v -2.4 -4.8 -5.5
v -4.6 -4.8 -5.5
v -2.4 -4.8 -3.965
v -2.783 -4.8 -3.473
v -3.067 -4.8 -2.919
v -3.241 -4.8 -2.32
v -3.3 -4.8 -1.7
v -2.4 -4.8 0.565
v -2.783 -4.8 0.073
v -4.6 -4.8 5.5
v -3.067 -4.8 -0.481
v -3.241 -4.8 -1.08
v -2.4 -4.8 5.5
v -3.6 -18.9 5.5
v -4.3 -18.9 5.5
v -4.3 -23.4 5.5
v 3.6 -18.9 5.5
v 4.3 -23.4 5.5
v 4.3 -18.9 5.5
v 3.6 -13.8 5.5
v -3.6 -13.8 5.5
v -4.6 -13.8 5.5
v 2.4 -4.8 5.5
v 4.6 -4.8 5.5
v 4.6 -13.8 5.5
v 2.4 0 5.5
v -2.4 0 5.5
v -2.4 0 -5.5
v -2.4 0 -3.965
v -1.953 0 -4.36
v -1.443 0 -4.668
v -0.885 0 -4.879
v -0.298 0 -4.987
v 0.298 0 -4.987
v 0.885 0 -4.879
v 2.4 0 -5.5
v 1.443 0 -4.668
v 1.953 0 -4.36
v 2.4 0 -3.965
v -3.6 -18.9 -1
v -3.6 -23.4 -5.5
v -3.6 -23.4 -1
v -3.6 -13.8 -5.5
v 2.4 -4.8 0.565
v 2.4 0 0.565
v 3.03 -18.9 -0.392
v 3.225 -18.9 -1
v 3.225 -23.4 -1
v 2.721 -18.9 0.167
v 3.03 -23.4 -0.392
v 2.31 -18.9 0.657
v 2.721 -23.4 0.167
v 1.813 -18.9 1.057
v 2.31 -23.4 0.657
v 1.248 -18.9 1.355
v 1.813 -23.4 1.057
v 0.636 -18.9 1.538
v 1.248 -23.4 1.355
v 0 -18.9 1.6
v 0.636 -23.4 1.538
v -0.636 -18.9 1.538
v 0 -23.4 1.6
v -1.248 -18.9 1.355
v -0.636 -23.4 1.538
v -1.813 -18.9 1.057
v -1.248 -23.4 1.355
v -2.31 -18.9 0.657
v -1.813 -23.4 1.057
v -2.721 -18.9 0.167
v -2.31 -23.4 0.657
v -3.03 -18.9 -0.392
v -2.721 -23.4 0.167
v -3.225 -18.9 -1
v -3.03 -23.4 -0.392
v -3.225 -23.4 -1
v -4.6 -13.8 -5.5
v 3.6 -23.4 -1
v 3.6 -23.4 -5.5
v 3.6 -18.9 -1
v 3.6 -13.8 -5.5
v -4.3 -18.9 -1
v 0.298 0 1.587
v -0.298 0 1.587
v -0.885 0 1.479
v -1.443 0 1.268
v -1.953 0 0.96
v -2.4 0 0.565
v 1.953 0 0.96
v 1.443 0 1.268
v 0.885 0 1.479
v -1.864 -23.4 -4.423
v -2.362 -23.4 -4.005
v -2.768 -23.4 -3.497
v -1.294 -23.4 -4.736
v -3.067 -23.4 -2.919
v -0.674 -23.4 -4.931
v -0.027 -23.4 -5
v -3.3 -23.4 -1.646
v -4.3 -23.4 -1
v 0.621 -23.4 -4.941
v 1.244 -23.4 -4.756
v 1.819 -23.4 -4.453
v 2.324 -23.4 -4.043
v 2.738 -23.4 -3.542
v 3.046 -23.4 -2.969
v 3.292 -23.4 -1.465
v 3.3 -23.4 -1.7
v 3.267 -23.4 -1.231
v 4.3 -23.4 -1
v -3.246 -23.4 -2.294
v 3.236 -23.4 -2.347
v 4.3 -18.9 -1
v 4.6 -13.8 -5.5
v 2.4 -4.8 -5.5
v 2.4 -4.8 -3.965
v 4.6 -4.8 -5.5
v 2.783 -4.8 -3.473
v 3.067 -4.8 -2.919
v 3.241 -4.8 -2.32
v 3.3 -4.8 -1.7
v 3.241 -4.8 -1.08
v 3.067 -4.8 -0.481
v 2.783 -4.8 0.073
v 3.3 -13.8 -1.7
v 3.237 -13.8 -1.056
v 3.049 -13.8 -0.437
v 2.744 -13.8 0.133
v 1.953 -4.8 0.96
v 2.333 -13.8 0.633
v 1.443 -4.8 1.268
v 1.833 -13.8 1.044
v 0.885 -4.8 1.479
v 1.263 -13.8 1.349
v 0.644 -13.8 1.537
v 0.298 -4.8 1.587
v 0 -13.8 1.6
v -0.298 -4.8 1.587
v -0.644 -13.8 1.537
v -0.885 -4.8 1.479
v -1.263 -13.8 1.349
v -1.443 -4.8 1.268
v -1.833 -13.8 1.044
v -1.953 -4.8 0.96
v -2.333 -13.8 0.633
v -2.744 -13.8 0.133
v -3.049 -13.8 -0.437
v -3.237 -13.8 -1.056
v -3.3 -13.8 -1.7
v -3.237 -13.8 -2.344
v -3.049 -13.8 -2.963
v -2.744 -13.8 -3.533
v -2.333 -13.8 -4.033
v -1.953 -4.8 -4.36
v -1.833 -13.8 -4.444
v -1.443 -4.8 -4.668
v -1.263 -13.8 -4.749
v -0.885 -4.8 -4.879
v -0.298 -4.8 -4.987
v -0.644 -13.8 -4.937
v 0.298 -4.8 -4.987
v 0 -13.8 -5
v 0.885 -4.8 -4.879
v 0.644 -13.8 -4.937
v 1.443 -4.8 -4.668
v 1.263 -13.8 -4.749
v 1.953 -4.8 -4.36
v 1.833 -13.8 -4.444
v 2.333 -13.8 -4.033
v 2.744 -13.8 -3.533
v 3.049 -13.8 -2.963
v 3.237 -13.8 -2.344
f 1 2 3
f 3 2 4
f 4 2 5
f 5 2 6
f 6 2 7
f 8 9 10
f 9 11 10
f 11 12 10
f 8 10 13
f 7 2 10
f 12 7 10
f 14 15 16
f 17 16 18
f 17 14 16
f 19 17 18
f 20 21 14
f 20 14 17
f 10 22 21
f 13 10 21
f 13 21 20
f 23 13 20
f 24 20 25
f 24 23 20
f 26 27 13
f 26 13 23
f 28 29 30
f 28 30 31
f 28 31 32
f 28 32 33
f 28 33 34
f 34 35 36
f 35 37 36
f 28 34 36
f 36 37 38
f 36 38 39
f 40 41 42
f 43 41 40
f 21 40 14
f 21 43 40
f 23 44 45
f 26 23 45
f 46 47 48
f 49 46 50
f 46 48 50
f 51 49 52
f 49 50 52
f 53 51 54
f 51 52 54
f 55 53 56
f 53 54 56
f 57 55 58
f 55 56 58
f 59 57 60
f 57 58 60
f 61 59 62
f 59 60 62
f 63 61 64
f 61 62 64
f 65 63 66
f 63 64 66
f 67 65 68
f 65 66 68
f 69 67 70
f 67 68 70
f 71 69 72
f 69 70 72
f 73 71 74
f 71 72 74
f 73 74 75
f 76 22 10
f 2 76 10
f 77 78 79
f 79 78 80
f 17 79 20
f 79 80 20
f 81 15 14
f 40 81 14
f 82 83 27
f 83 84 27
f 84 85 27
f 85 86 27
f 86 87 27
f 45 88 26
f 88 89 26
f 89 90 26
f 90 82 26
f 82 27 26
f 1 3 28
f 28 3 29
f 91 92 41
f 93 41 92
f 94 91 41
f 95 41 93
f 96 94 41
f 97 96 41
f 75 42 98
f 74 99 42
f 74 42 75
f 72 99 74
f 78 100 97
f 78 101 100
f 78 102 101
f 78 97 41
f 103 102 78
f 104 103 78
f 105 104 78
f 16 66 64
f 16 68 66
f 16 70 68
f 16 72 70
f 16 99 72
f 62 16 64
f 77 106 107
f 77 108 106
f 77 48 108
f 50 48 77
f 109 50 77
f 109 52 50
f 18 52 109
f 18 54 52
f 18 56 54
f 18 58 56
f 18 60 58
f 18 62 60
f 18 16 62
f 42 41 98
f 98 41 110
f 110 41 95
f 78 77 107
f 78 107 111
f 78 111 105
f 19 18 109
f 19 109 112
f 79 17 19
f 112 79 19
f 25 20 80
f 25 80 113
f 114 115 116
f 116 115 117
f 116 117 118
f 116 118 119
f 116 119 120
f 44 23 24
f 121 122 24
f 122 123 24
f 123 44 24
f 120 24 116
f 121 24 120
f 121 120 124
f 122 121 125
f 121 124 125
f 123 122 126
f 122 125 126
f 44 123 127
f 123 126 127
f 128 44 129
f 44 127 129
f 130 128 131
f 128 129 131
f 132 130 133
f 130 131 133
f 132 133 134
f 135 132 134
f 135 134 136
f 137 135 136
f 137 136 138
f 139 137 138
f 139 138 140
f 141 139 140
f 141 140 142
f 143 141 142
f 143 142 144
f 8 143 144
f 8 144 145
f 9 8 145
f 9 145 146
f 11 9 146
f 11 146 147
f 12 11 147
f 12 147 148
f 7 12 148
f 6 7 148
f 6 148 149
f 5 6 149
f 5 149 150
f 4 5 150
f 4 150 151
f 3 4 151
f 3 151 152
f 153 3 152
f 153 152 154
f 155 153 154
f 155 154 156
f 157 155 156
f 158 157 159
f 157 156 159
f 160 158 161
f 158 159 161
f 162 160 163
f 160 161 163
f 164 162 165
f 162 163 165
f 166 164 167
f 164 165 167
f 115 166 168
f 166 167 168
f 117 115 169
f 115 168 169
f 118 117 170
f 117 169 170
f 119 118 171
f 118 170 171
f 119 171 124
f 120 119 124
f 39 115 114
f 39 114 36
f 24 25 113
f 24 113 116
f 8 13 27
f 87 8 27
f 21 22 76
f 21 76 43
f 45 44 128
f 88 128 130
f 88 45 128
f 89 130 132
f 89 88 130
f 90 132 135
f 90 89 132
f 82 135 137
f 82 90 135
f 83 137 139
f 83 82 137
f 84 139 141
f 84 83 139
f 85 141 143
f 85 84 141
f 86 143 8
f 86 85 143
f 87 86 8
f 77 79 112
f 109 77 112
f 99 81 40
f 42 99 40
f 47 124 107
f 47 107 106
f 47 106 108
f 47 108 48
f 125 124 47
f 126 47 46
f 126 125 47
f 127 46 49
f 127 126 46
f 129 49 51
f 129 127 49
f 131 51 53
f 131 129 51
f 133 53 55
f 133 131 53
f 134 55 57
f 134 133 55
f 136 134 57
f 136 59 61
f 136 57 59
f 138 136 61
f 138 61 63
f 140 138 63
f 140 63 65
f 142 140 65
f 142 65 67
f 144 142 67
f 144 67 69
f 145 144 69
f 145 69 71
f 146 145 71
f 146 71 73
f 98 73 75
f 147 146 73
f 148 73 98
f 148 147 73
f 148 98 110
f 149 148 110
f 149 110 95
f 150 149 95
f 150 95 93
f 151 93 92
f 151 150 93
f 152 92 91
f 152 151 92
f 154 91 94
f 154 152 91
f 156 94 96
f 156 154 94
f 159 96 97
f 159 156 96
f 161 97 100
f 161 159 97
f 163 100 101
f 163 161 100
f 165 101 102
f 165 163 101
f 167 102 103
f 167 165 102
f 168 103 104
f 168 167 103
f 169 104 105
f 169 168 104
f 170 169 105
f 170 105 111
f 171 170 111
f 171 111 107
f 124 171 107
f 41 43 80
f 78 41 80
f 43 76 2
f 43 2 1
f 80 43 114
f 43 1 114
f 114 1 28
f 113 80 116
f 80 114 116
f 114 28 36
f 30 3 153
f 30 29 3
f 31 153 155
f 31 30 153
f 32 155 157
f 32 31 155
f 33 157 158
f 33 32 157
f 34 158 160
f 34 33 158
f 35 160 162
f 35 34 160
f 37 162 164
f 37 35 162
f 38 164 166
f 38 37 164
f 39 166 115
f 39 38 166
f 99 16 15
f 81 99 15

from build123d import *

# Parameters (mm, degrees)
F0_W     = 7.2
F0_H     = 11
F0_R     = 3.3
F1_DEPTH = 23.4
F2_W     = 1.2
F2_H     = 4.8
F3_DEPTH = 11.001
F4_W     = 9.2
F4_H     = 9
F5_DEPTH = 11
F6_W     = 8.6
F6_H     = 4.5
F7_DEPTH = 6.5
F8_R     = 3.3
F9_DEPTH = 23.401


with BuildPart() as f1:
    # F0 (on Front) → F1 (new body)
    with BuildSketch(Plane.XZ):
        Rectangle(F0_W, F0_H)
        with Locations((0, -1.7)):
            Circle(F0_R, mode=Mode.SUBTRACT)
    extrude(amount=F1_DEPTH)

    # F2 (on face) → F3 (cut, through all)
    with BuildSketch(Plane.XY.offset(5.5)):
        with Locations((3, -2.4)):
            Rectangle(F2_W, F2_H)
        with Locations((-3, -2.4)):
            Rectangle(F2_W, F2_H)
    extrude(amount=-F3_DEPTH, mode=Mode.SUBTRACT)

    # F4 (on face) → F5 (join, through all)
    with BuildSketch(Plane.XY.offset(5.5)):
        with Locations((0, -9.3)):
            Rectangle(F4_W, F4_H)
    extrude(amount=-F5_DEPTH)

    # F6 (on face) → F7 (join)
    with BuildSketch(Plane.XY.offset(5.5)):
        with Locations((0, -21.15)):
            Rectangle(F6_W, F6_H)
    extrude(amount=-F7_DEPTH)

    # F8 (on face) → F9 (cut, through all)
    with BuildSketch(Plane.XZ.offset(23.4)):
        with Locations((0, -1.7)):
            Circle(F8_R)
    extrude(amount=-F9_DEPTH, mode=Mode.SUBTRACT)


solid = f1.part
